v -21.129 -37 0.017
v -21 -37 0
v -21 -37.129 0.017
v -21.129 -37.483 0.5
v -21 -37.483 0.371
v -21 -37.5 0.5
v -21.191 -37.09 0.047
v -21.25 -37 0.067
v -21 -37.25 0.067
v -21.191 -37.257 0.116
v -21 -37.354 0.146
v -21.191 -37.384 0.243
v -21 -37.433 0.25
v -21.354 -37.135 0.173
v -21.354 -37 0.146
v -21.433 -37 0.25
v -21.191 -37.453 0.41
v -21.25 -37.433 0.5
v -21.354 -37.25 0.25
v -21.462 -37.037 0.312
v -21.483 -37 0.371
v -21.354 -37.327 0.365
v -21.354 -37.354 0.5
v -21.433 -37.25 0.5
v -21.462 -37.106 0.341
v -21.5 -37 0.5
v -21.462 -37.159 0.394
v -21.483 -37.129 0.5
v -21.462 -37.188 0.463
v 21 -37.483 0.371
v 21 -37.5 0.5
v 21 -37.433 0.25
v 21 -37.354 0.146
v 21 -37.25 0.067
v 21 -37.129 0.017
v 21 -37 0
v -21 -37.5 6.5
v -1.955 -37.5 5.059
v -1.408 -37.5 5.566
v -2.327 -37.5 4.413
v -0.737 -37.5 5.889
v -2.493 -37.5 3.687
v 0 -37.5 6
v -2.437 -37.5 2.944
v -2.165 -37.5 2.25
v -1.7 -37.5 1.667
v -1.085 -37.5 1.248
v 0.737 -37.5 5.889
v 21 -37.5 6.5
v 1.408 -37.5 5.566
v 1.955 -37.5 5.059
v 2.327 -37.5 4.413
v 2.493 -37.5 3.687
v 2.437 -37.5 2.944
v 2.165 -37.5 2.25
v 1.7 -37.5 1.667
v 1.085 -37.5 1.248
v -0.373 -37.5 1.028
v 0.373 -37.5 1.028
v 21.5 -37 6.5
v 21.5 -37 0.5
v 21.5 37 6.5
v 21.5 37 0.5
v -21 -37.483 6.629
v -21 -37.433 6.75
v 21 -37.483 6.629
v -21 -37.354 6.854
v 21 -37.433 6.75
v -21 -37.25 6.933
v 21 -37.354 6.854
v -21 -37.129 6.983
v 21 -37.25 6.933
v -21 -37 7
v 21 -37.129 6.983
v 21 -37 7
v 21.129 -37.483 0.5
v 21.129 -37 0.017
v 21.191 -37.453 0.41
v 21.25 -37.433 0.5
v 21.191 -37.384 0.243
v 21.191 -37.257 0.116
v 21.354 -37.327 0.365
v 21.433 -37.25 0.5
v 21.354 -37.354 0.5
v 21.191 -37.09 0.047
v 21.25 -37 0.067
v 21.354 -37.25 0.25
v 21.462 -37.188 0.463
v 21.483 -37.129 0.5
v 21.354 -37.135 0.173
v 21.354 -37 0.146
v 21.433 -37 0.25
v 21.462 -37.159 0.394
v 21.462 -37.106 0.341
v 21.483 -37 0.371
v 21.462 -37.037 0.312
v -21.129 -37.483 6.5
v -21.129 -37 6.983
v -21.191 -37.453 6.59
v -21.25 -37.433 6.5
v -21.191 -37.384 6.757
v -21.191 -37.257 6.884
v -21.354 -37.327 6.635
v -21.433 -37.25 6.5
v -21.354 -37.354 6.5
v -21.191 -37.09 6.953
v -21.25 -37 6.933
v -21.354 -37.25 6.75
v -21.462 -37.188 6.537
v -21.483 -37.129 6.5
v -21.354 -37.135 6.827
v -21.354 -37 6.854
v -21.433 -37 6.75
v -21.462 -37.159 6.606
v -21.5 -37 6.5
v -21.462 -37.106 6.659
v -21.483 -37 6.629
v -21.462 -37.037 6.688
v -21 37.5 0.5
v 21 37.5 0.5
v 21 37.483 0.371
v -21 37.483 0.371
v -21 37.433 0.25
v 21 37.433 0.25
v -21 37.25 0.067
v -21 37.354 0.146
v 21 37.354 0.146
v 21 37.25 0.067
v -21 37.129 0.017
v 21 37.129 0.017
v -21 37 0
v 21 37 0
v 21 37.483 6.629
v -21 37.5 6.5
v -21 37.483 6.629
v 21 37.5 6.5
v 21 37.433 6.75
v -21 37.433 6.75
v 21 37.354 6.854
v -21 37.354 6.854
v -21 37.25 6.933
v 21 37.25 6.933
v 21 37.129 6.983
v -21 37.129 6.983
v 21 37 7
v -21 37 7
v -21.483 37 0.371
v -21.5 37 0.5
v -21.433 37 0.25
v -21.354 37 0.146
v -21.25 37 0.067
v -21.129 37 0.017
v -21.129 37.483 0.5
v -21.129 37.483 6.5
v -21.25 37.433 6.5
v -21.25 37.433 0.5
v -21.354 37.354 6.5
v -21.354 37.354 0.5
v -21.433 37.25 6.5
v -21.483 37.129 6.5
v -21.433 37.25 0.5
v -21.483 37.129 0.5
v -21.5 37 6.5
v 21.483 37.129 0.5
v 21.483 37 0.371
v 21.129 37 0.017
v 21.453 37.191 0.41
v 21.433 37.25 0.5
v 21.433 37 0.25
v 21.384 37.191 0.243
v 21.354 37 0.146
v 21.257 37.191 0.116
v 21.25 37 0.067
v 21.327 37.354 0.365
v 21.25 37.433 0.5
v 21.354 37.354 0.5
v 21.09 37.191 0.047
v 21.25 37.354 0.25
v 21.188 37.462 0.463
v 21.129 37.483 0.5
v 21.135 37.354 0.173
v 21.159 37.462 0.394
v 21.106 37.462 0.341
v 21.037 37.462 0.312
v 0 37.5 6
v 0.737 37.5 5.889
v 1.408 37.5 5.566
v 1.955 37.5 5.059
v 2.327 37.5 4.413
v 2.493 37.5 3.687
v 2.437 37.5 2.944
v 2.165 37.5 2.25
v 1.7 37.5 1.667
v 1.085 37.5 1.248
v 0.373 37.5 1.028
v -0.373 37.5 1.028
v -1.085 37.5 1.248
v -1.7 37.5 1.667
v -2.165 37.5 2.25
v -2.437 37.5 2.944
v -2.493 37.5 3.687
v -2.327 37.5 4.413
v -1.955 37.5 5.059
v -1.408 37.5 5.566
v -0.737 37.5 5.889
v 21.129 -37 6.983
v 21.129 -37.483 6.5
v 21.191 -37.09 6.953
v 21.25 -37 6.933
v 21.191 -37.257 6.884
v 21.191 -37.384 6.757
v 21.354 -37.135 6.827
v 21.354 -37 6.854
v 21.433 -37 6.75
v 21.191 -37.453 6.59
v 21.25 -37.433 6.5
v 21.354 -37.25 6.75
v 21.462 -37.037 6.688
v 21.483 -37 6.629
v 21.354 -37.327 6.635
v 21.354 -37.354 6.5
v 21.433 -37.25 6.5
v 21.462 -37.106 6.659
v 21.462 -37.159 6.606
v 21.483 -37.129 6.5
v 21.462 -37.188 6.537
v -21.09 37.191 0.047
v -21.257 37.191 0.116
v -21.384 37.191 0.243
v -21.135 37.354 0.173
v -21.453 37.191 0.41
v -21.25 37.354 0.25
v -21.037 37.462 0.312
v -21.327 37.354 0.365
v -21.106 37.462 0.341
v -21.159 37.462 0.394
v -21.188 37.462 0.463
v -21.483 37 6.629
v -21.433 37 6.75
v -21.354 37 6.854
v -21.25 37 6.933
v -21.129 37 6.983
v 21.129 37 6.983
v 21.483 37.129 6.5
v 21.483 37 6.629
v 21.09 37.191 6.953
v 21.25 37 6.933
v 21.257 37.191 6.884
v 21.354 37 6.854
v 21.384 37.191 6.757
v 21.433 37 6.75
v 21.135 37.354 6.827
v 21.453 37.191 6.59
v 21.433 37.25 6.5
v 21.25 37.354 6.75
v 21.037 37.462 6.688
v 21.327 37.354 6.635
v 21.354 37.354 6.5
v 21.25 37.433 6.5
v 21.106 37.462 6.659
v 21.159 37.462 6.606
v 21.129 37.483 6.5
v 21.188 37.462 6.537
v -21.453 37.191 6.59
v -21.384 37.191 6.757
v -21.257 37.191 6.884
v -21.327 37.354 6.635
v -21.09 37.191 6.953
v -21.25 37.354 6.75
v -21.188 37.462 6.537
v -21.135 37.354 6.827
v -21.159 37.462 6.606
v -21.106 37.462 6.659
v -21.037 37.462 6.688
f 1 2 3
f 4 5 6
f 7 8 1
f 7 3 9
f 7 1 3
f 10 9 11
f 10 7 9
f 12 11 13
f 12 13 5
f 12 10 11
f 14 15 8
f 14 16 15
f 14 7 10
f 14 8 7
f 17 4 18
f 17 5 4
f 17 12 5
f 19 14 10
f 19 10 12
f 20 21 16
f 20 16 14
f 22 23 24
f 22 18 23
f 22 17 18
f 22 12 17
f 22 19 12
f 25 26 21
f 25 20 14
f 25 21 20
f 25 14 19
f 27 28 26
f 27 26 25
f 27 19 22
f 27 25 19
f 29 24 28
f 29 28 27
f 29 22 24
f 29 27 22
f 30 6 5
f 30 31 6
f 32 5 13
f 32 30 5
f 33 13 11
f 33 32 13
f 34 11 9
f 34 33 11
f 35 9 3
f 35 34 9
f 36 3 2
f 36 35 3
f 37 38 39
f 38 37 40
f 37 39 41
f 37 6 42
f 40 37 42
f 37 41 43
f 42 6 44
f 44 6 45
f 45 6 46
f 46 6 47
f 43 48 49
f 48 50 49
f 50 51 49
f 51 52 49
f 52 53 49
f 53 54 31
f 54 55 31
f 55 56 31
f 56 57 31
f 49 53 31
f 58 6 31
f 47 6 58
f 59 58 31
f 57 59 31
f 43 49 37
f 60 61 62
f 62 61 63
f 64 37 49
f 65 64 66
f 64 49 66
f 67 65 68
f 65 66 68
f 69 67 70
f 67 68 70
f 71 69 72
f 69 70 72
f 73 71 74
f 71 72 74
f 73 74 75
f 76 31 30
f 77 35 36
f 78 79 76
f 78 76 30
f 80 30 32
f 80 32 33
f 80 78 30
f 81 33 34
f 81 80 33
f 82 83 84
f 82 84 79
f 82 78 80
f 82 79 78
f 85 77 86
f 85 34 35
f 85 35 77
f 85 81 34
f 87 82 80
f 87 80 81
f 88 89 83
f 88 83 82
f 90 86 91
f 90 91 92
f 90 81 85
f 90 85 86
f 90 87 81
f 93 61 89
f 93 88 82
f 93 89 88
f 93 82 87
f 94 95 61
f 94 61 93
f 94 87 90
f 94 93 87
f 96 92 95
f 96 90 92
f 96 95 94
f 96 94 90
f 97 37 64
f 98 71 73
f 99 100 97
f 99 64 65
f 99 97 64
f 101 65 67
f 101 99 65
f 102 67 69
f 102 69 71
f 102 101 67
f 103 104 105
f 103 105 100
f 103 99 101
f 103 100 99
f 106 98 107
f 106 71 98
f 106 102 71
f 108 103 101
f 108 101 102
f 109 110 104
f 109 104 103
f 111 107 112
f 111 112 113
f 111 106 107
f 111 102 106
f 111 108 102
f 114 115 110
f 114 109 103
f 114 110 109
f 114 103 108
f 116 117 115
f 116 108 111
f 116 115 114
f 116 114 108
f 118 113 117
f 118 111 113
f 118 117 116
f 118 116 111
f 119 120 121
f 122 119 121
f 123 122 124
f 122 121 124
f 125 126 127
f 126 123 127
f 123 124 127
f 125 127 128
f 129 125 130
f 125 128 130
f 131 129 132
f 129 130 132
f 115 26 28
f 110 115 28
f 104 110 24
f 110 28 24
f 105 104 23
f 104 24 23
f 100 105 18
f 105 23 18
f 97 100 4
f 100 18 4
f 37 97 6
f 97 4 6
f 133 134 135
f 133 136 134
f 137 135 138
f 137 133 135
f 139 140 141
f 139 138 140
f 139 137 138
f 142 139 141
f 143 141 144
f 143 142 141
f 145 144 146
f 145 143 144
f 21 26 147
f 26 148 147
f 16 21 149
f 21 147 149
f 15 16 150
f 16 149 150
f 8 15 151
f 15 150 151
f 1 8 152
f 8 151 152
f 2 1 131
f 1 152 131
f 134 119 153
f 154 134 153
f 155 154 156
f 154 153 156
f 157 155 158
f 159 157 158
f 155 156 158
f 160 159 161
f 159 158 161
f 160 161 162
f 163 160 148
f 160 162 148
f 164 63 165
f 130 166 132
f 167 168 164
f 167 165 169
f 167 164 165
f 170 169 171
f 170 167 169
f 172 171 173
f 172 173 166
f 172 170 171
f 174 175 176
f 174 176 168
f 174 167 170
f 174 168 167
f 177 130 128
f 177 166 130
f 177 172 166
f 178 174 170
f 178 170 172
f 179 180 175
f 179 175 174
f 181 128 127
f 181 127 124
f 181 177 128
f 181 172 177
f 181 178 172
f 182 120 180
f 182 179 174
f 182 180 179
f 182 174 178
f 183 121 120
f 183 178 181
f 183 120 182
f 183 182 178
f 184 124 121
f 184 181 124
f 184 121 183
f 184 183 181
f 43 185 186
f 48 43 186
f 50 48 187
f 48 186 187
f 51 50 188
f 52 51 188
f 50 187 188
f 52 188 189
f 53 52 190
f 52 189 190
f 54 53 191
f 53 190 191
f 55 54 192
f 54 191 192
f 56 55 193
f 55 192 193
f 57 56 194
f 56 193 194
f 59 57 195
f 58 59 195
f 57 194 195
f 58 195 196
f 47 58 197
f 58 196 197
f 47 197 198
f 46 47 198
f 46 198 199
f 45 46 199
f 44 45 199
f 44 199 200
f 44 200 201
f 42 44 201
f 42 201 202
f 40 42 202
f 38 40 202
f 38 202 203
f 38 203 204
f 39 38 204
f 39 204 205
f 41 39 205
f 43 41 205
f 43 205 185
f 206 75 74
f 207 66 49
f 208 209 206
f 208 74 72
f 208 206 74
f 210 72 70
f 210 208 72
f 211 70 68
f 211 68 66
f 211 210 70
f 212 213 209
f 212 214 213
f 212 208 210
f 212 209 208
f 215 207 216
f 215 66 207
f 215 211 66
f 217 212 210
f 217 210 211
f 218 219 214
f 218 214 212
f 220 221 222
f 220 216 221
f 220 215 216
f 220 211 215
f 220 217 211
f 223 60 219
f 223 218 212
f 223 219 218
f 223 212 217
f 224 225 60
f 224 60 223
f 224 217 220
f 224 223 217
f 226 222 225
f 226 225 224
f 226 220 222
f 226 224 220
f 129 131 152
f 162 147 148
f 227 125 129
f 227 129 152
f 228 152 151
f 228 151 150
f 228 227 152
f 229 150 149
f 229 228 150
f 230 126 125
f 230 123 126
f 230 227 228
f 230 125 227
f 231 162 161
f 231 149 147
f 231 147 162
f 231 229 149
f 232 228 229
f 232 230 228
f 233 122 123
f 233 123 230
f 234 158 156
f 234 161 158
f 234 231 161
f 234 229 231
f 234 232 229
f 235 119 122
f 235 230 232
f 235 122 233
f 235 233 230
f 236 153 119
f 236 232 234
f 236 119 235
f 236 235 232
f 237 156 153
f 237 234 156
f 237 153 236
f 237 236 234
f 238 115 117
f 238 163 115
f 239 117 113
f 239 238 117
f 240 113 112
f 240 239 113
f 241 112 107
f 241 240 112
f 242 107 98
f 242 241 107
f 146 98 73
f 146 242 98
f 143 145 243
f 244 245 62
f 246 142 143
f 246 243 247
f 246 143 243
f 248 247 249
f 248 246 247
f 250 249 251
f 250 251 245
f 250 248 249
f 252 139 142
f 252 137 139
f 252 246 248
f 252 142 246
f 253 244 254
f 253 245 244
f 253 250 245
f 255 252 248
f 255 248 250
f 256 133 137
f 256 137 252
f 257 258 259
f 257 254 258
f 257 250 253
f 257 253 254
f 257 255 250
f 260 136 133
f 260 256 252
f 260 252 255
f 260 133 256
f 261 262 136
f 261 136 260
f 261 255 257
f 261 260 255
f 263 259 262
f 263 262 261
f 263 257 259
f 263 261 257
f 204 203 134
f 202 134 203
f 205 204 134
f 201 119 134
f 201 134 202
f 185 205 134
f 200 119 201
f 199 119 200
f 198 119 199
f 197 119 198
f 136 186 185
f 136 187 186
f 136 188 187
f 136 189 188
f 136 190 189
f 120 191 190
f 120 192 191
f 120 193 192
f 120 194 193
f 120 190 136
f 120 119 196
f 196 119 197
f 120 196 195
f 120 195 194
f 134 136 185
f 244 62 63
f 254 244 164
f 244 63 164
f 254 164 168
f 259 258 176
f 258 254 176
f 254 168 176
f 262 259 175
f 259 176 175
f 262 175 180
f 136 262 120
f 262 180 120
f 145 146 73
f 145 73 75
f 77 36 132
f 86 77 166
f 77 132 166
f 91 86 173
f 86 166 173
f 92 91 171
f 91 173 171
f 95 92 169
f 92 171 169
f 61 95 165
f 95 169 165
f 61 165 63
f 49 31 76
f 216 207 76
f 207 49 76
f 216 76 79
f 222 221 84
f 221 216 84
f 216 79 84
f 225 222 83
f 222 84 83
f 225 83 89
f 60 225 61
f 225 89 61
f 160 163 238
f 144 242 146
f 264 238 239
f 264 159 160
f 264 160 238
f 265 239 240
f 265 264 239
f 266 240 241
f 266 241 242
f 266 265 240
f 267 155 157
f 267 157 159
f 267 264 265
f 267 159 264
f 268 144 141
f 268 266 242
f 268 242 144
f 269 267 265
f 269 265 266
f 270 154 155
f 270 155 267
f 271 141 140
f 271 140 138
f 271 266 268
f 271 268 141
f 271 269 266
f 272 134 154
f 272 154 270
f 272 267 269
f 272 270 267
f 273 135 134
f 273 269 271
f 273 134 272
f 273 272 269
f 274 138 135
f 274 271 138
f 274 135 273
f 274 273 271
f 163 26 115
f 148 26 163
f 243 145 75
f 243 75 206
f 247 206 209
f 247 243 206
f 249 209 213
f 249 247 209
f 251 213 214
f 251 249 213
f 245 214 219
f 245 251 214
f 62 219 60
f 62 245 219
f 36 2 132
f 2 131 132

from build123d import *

# Parameters (mm, degrees)
SKETCH1_W           = 43
SKETCH1_H           = 75
BOSS_EXTRUDE1_DEPTH = 7
CUT_EXTRUDE1_REACH  = 80.334
SKETCH2_R           = 2.5
FILLET1_R           = 0.5
FILLET2_R           = 0.5


with BuildPart() as part:
    # Sketch1 → Boss-Extrude1 (new body)
    with BuildSketch(Plane.XY):
        Rectangle(SKETCH1_W, SKETCH1_H)
    extrude(amount=BOSS_EXTRUDE1_DEPTH)

    # Sketch2 → Cut-Extrude1 (cut, up to next)
    with BuildSketch(Plane(origin=(0, 37.5, 0), x_dir=(1, 0, 0), z_dir=(0, 1, 0)), mode=Mode.PRIVATE) as cut_extrude1_sk1:
        with Locations(Location((0, -3.5, 0), (0, 0, 270))):
            Circle(SKETCH2_R)
    cut_extrude1_tool1 = extrude(cut_extrude1_sk1.sketch, amount=-CUT_EXTRUDE1_REACH, mode=Mode.PRIVATE) & part.part
    add(cut_extrude1_tool1.solids().sort_by_distance((0, 37.5, 3.5))[0], mode=Mode.SUBTRACT)

    # Fillet1
    fillet1_edges = [part.edges().sort_by_distance(p)[0] for p in [
        (-21.5, 0, 7),
        (0, -37.5, 7),
        (21.5, 0, 7),
        (0, -37.5, 0),
        (-21.5, 0, 0),
        (0, 37.5, 0),
        (21.5, 0, 0),
        (0, 37.5, 7),
    ]]
    fillet(fillet1_edges, radius=FILLET1_R)

    # Fillet2
    # the kernel refuses this fillet: 0.5 mm, written as the material it takes off along each edge
    with BuildSketch(Plane(origin=(-21, -37, 6.5), x_dir=(0, -1, 0), z_dir=(-1, 0, 0))) as fillet2_piece_1_section:
        Polygon((0, 0), (FILLET2_R, 0), (FILLET2_R, FILLET2_R), (0, FILLET2_R), align=None)
    fillet2_piece_1 = extrude(amount=FILLET2_R, mode=Mode.PRIVATE)
    fillet2_piece_1 = fillet2_piece_1 - Plane(origin=(-21, -37, 6.5), x_dir=(0, 0.7071067811865475, -0.7071067811865475), z_dir=(-1, 0, 0)) * Sphere(FILLET2_R, mode=Mode.PRIVATE)
    add(fillet2_piece_1, mode=Mode.SUBTRACT)
    with BuildSketch(Plane(origin=(-21, 37, 6.5), x_dir=(-1, 0, 0), z_dir=(0, 1, 0))) as fillet2_piece_2_section:
        Polygon((0, 0), (FILLET2_R, 0), (FILLET2_R, FILLET2_R), (0, FILLET2_R), align=None)
    fillet2_piece_2 = extrude(amount=FILLET2_R, mode=Mode.PRIVATE)
    fillet2_piece_2 = fillet2_piece_2 - Plane(origin=(-21, 37, 6.5), x_dir=(0.7071067811865475, 0, -0.7071067811865475), z_dir=(0, 1, 0)) * Sphere(FILLET2_R, mode=Mode.PRIVATE)
    add(fillet2_piece_2, mode=Mode.SUBTRACT)
    with BuildSketch(Plane(origin=(21, -37, 6.5), x_dir=(0, -1, 0), z_dir=(1, 0, 0))) as fillet2_piece_3_section:
        Polygon((0, 0), (FILLET2_R, 0), (FILLET2_R, -FILLET2_R), (0, -FILLET2_R), align=None)
    fillet2_piece_3 = extrude(amount=FILLET2_R, mode=Mode.PRIVATE)
    fillet2_piece_3 = fillet2_piece_3 - Plane(origin=(21, -37, 6.5), x_dir=(0, 0.7071067811865475, -0.7071067811865475), z_dir=(1, 0, 0)) * Sphere(FILLET2_R, mode=Mode.PRIVATE)
    add(fillet2_piece_3, mode=Mode.SUBTRACT)
    with BuildSketch(Plane(origin=(21, 37, 6.5), x_dir=(1, 0, 0), z_dir=(0, 1, 0))) as fillet2_piece_4_section:
        Polygon((0, 0), (FILLET2_R, 0), (FILLET2_R, -FILLET2_R), (0, -FILLET2_R), align=None)
    fillet2_piece_4 = extrude(amount=FILLET2_R, mode=Mode.PRIVATE)
    fillet2_piece_4 = fillet2_piece_4 - Plane(origin=(21, 37, 6.5), x_dir=(-0.7071067811865475, 0, -0.7071067811865475), z_dir=(0, 1, 0)) * Sphere(FILLET2_R, mode=Mode.PRIVATE)
    add(fillet2_piece_4, mode=Mode.SUBTRACT)
    with BuildSketch(Plane(origin=(21, -37, 0.5), x_dir=(0, -1, 0), z_dir=(1, 0, 0))) as fillet2_piece_5_section:
        Polygon((0, 0), (FILLET2_R, 0), (FILLET2_R, FILLET2_R), (0, FILLET2_R), align=None)
    fillet2_piece_5 = extrude(amount=FILLET2_R, mode=Mode.PRIVATE)
    fillet2_piece_5 = fillet2_piece_5 - Plane(origin=(21, -37, 0.5), x_dir=(0, 0.7071067811865475, 0.7071067811865475), z_dir=(1, 0, 0)) * Sphere(FILLET2_R, mode=Mode.PRIVATE)
    add(fillet2_piece_5, mode=Mode.SUBTRACT)
    with BuildSketch(Plane(origin=(-21, -37, 0.5), x_dir=(0, -1, 0), z_dir=(-1, 0, 0))) as fillet2_piece_6_section:
        Polygon((0, 0), (FILLET2_R, 0), (FILLET2_R, -FILLET2_R), (0, -FILLET2_R), align=None)
    fillet2_piece_6 = extrude(amount=FILLET2_R, mode=Mode.PRIVATE)
    fillet2_piece_6 = fillet2_piece_6 - Plane(origin=(-21, -37, 0.5), x_dir=(0, 0.7071067811865475, 0.7071067811865475), z_dir=(-1, 0, 0)) * Sphere(FILLET2_R, mode=Mode.PRIVATE)
    add(fillet2_piece_6, mode=Mode.SUBTRACT)
    with BuildSketch(Plane(origin=(21, 37, 0.5), x_dir=(1, 0, 0), z_dir=(0, 1, 0))) as fillet2_piece_7_section:
        Polygon((0, 0), (FILLET2_R, 0), (FILLET2_R, FILLET2_R), (0, FILLET2_R), align=None)
    fillet2_piece_7 = extrude(amount=FILLET2_R, mode=Mode.PRIVATE)
    fillet2_piece_7 = fillet2_piece_7 - Plane(origin=(21, 37, 0.5), x_dir=(-0.7071067811865475, 0, 0.7071067811865475), z_dir=(0, 1, 0)) * Sphere(FILLET2_R, mode=Mode.PRIVATE)
    add(fillet2_piece_7, mode=Mode.SUBTRACT)
    with BuildSketch(Plane(origin=(-21, 37, 0.5), x_dir=(-1, 0, 0), z_dir=(0, 1, 0))) as fillet2_piece_8_section:
        Polygon((0, 0), (FILLET2_R, 0), (FILLET2_R, -FILLET2_R), (0, -FILLET2_R), align=None)
    fillet2_piece_8 = extrude(amount=FILLET2_R, mode=Mode.PRIVATE)
    fillet2_piece_8 = fillet2_piece_8 - Plane(origin=(-21, 37, 0.5), x_dir=(0.7071067811865475, 0, 0.7071067811865475), z_dir=(0, 1, 0)) * Sphere(FILLET2_R, mode=Mode.PRIVATE)
    add(fillet2_piece_8, mode=Mode.SUBTRACT)
    with BuildSketch(Plane(origin=(21.5, 37.5, 0.5), x_dir=(-1, 0, 0), z_dir=(0, 0, 1)), Plane(origin=(21.5, -37.5, 0.5), x_dir=(0, 1, 0), z_dir=(0, 0, 1))) as fillet2_piece_9:
        with BuildLine():
            CenterArc((FILLET2_R, FILLET2_R), FILLET2_R, 180, 90)
            Line((0, FILLET2_R), (0, 0))
            Line((0, 0), (FILLET2_R, 0))
        make_face()
    extrude(amount=6, mode=Mode.SUBTRACT)
    with BuildSketch(Plane(origin=(-21.5, -37.5, 0.5), x_dir=(0, 1, 0), z_dir=(0, 0, 1)), Plane(origin=(-21.5, 37.5, 0.5), x_dir=(1, 0, 0), z_dir=(0, 0, 1))) as fillet2_piece_10:
        with BuildLine():
            CenterArc((FILLET2_R, -FILLET2_R), FILLET2_R, 90, 90)
            Line((0, -FILLET2_R), (0, 0))
            Line((0, 0), (FILLET2_R, 0))
        make_face()
    extrude(amount=6, mode=Mode.SUBTRACT)


solid = part.part
